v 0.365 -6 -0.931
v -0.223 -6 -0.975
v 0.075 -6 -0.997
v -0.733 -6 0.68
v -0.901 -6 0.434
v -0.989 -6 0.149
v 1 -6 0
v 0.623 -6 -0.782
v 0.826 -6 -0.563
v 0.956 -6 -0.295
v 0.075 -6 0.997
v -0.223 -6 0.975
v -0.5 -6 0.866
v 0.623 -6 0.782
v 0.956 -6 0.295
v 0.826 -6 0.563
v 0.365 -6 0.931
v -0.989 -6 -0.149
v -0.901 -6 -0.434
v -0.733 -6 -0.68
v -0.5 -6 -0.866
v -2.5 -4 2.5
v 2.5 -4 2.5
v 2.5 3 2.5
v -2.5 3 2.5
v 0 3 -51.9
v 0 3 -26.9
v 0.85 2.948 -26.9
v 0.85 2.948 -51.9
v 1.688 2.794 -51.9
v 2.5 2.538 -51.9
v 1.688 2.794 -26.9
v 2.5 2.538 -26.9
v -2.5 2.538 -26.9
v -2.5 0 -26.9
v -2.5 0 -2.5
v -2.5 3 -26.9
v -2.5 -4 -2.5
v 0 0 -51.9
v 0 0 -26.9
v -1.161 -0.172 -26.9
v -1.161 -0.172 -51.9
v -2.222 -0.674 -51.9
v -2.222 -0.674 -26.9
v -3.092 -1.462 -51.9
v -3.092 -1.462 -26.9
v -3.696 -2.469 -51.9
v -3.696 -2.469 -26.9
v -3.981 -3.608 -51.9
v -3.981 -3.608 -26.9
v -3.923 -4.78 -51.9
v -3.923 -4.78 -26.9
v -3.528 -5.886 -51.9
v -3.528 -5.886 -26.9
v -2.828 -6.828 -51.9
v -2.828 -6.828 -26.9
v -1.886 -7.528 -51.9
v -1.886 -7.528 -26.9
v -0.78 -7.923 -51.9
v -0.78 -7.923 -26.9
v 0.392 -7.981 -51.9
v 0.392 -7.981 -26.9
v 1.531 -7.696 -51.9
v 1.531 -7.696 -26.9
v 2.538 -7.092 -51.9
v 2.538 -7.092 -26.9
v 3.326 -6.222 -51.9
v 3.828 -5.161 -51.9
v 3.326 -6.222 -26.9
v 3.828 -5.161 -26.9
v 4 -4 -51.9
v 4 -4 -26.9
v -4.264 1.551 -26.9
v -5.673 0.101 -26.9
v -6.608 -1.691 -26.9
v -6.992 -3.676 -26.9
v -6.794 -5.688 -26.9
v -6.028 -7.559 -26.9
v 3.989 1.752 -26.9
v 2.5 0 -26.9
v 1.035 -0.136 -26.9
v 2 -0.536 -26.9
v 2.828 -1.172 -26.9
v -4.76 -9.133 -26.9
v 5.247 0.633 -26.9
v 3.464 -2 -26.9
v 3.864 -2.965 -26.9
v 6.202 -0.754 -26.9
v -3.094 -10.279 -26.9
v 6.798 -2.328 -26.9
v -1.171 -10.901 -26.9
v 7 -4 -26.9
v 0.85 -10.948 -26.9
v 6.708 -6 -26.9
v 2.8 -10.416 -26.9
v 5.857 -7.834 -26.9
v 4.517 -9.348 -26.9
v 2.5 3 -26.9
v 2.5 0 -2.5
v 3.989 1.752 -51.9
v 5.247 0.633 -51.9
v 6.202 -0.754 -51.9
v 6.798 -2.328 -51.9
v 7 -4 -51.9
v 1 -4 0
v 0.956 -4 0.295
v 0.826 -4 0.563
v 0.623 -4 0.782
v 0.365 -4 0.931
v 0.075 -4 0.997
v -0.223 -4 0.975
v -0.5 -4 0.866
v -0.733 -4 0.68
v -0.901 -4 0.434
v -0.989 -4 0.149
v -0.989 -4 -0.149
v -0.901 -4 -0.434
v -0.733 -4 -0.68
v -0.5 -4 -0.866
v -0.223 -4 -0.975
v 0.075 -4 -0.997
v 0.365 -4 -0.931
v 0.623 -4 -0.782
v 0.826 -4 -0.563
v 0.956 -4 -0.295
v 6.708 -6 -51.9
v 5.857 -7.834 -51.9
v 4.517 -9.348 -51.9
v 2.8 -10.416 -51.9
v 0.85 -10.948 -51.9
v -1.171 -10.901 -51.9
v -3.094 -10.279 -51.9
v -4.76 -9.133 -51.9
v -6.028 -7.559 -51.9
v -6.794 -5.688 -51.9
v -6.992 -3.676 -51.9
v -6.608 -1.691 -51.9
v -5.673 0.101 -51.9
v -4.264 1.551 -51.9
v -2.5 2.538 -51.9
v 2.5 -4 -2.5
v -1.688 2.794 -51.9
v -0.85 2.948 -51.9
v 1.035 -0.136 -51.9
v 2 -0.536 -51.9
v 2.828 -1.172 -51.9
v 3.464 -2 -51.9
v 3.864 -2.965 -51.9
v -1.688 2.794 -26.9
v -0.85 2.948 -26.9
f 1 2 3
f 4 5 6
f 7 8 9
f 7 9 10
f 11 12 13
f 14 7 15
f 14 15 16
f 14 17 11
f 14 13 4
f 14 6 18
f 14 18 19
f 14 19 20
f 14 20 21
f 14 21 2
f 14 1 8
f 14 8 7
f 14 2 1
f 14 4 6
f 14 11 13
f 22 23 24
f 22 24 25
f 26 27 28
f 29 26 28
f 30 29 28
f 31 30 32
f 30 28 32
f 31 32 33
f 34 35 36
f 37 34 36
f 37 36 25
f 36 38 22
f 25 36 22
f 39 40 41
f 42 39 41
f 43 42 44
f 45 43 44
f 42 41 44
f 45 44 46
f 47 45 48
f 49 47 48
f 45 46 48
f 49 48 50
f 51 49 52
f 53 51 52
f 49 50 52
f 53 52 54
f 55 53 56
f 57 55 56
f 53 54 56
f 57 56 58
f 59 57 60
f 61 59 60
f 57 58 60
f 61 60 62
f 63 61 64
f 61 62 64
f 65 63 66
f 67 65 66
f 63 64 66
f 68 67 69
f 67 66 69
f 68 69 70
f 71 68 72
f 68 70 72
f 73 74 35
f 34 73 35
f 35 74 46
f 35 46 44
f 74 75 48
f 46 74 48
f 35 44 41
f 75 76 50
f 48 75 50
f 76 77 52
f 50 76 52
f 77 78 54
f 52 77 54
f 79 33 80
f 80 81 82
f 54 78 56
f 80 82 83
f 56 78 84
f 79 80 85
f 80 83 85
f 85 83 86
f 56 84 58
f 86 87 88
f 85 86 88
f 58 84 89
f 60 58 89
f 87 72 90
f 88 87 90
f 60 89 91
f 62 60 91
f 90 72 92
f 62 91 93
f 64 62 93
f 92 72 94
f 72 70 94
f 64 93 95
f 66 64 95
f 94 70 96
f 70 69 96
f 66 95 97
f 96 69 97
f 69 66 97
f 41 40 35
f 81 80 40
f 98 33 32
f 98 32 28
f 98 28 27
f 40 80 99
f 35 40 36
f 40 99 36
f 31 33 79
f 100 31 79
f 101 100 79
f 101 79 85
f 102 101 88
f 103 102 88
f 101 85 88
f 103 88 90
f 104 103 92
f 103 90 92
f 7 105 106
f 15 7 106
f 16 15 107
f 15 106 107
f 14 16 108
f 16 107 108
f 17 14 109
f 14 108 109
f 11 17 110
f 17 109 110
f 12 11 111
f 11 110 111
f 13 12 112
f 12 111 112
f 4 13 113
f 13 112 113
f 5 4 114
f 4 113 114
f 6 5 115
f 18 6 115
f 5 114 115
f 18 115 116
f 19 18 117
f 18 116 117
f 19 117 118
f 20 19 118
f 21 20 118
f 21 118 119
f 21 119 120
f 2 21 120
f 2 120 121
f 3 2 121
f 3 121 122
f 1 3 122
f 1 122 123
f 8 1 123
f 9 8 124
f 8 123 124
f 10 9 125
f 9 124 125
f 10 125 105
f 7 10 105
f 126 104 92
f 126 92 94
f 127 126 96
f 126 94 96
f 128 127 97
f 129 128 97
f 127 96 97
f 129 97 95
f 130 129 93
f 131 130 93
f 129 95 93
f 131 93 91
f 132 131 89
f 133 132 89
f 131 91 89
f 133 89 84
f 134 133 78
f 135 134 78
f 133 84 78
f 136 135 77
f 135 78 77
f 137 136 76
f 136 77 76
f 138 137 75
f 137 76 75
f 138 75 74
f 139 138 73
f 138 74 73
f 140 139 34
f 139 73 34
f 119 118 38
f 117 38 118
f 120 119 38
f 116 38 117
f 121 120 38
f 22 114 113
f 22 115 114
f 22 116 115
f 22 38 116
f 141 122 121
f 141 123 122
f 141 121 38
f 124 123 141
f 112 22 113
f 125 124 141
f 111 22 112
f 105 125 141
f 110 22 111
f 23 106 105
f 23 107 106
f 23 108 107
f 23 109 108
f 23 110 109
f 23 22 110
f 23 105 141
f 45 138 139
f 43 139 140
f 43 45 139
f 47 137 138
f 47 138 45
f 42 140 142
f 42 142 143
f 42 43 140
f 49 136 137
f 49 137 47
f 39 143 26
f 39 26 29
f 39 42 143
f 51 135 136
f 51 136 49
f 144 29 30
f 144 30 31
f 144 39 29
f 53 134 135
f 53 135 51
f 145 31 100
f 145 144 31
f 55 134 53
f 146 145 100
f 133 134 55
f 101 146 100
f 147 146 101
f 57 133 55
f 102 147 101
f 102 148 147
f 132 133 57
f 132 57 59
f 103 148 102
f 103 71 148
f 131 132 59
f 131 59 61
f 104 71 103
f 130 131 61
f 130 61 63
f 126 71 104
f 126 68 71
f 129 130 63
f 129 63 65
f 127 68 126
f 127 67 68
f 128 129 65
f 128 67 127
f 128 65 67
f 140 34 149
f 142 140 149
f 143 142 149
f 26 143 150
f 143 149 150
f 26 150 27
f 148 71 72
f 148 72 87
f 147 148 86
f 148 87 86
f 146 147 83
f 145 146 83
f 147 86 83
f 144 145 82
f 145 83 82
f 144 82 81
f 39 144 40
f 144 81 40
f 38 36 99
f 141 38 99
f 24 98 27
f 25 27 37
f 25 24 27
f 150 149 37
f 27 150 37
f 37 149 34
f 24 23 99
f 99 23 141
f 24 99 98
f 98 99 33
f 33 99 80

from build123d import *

# Parameters (mm, degrees)
F0_W     = 5
F0_H     = 5
F1_DEPTH = 4
F2_R     = 1
F3_DEPTH = 2
F4_W     = 5
F4_H     = 24.4
F4_H_2   = 5
F5_DEPTH = 3
F7_DEPTH = 25


with BuildPart() as f1:
    # F0 (on Front) → F1 (new body)
    with BuildSketch(Plane.XZ):
        Rectangle(F0_W, F0_H)
    extrude(amount=F1_DEPTH)

    # F2 (on face) → F3 (join)
    with BuildSketch(Plane.XZ.offset(4)):
        Circle(F2_R)
    extrude(amount=F3_DEPTH)

    # F4 (on face) → F5 (join)
    with BuildSketch(Plane(origin=(0, 0, 0), x_dir=(-1, 0, 0), z_dir=(0, 1, 0))):
        with Locations((0, -14.7)):
            Rectangle(F4_W, F4_H)
        Rectangle(F4_W, F4_H_2)
    extrude(amount=F5_DEPTH)

    # F6 (on face) → F7 (join)
    with BuildSketch(Plane(origin=(0, 0, -26.9), x_dir=(1, 0, 0), z_dir=(0, 0, -1))):
        with BuildLine():
            Line((-2.5, 0), (0, 0))
            Line((0, 0), (2.5, 0))
            Line((2.5, 0), (2.5, -2.5383484153))
            ThreePointArc((2.5, -2.5383484153), (5.7662812973, 0.0313730334), (7, 4))
            ThreePointArc((7, 4), (-3.9686269666, 9.7662812973), (-2.5, -2.5383484153))
            Line((-2.5, -2.5383484153), (-2.5, 0))
        make_face()
        with BuildLine():
            ThreePointArc((0, 0), (-2.8284271247, 6.8284271247), (4, 4))
            ThreePointArc((4, 4), (2.8284271247, 1.1715728753), (0, 0))
        make_face(mode=Mode.SUBTRACT)
        with BuildLine():
            Line((2.5, 0), (0, 0))
            Line((0, 0), (-2.5, 0))
            Line((-2.5, 0), (-2.5, -2.5383484153))
            ThreePointArc((-2.5, -2.5383484153), (-1.2711335675, -2.8836196477), (0, -3))
            ThreePointArc((0, -3), (1.2711335675, -2.8836196477), (2.5, -2.5383484153))
            Line((2.5, -2.5383484153), (2.5, 0))
        make_face()
    extrude(amount=F7_DEPTH)


solid = f1.part
